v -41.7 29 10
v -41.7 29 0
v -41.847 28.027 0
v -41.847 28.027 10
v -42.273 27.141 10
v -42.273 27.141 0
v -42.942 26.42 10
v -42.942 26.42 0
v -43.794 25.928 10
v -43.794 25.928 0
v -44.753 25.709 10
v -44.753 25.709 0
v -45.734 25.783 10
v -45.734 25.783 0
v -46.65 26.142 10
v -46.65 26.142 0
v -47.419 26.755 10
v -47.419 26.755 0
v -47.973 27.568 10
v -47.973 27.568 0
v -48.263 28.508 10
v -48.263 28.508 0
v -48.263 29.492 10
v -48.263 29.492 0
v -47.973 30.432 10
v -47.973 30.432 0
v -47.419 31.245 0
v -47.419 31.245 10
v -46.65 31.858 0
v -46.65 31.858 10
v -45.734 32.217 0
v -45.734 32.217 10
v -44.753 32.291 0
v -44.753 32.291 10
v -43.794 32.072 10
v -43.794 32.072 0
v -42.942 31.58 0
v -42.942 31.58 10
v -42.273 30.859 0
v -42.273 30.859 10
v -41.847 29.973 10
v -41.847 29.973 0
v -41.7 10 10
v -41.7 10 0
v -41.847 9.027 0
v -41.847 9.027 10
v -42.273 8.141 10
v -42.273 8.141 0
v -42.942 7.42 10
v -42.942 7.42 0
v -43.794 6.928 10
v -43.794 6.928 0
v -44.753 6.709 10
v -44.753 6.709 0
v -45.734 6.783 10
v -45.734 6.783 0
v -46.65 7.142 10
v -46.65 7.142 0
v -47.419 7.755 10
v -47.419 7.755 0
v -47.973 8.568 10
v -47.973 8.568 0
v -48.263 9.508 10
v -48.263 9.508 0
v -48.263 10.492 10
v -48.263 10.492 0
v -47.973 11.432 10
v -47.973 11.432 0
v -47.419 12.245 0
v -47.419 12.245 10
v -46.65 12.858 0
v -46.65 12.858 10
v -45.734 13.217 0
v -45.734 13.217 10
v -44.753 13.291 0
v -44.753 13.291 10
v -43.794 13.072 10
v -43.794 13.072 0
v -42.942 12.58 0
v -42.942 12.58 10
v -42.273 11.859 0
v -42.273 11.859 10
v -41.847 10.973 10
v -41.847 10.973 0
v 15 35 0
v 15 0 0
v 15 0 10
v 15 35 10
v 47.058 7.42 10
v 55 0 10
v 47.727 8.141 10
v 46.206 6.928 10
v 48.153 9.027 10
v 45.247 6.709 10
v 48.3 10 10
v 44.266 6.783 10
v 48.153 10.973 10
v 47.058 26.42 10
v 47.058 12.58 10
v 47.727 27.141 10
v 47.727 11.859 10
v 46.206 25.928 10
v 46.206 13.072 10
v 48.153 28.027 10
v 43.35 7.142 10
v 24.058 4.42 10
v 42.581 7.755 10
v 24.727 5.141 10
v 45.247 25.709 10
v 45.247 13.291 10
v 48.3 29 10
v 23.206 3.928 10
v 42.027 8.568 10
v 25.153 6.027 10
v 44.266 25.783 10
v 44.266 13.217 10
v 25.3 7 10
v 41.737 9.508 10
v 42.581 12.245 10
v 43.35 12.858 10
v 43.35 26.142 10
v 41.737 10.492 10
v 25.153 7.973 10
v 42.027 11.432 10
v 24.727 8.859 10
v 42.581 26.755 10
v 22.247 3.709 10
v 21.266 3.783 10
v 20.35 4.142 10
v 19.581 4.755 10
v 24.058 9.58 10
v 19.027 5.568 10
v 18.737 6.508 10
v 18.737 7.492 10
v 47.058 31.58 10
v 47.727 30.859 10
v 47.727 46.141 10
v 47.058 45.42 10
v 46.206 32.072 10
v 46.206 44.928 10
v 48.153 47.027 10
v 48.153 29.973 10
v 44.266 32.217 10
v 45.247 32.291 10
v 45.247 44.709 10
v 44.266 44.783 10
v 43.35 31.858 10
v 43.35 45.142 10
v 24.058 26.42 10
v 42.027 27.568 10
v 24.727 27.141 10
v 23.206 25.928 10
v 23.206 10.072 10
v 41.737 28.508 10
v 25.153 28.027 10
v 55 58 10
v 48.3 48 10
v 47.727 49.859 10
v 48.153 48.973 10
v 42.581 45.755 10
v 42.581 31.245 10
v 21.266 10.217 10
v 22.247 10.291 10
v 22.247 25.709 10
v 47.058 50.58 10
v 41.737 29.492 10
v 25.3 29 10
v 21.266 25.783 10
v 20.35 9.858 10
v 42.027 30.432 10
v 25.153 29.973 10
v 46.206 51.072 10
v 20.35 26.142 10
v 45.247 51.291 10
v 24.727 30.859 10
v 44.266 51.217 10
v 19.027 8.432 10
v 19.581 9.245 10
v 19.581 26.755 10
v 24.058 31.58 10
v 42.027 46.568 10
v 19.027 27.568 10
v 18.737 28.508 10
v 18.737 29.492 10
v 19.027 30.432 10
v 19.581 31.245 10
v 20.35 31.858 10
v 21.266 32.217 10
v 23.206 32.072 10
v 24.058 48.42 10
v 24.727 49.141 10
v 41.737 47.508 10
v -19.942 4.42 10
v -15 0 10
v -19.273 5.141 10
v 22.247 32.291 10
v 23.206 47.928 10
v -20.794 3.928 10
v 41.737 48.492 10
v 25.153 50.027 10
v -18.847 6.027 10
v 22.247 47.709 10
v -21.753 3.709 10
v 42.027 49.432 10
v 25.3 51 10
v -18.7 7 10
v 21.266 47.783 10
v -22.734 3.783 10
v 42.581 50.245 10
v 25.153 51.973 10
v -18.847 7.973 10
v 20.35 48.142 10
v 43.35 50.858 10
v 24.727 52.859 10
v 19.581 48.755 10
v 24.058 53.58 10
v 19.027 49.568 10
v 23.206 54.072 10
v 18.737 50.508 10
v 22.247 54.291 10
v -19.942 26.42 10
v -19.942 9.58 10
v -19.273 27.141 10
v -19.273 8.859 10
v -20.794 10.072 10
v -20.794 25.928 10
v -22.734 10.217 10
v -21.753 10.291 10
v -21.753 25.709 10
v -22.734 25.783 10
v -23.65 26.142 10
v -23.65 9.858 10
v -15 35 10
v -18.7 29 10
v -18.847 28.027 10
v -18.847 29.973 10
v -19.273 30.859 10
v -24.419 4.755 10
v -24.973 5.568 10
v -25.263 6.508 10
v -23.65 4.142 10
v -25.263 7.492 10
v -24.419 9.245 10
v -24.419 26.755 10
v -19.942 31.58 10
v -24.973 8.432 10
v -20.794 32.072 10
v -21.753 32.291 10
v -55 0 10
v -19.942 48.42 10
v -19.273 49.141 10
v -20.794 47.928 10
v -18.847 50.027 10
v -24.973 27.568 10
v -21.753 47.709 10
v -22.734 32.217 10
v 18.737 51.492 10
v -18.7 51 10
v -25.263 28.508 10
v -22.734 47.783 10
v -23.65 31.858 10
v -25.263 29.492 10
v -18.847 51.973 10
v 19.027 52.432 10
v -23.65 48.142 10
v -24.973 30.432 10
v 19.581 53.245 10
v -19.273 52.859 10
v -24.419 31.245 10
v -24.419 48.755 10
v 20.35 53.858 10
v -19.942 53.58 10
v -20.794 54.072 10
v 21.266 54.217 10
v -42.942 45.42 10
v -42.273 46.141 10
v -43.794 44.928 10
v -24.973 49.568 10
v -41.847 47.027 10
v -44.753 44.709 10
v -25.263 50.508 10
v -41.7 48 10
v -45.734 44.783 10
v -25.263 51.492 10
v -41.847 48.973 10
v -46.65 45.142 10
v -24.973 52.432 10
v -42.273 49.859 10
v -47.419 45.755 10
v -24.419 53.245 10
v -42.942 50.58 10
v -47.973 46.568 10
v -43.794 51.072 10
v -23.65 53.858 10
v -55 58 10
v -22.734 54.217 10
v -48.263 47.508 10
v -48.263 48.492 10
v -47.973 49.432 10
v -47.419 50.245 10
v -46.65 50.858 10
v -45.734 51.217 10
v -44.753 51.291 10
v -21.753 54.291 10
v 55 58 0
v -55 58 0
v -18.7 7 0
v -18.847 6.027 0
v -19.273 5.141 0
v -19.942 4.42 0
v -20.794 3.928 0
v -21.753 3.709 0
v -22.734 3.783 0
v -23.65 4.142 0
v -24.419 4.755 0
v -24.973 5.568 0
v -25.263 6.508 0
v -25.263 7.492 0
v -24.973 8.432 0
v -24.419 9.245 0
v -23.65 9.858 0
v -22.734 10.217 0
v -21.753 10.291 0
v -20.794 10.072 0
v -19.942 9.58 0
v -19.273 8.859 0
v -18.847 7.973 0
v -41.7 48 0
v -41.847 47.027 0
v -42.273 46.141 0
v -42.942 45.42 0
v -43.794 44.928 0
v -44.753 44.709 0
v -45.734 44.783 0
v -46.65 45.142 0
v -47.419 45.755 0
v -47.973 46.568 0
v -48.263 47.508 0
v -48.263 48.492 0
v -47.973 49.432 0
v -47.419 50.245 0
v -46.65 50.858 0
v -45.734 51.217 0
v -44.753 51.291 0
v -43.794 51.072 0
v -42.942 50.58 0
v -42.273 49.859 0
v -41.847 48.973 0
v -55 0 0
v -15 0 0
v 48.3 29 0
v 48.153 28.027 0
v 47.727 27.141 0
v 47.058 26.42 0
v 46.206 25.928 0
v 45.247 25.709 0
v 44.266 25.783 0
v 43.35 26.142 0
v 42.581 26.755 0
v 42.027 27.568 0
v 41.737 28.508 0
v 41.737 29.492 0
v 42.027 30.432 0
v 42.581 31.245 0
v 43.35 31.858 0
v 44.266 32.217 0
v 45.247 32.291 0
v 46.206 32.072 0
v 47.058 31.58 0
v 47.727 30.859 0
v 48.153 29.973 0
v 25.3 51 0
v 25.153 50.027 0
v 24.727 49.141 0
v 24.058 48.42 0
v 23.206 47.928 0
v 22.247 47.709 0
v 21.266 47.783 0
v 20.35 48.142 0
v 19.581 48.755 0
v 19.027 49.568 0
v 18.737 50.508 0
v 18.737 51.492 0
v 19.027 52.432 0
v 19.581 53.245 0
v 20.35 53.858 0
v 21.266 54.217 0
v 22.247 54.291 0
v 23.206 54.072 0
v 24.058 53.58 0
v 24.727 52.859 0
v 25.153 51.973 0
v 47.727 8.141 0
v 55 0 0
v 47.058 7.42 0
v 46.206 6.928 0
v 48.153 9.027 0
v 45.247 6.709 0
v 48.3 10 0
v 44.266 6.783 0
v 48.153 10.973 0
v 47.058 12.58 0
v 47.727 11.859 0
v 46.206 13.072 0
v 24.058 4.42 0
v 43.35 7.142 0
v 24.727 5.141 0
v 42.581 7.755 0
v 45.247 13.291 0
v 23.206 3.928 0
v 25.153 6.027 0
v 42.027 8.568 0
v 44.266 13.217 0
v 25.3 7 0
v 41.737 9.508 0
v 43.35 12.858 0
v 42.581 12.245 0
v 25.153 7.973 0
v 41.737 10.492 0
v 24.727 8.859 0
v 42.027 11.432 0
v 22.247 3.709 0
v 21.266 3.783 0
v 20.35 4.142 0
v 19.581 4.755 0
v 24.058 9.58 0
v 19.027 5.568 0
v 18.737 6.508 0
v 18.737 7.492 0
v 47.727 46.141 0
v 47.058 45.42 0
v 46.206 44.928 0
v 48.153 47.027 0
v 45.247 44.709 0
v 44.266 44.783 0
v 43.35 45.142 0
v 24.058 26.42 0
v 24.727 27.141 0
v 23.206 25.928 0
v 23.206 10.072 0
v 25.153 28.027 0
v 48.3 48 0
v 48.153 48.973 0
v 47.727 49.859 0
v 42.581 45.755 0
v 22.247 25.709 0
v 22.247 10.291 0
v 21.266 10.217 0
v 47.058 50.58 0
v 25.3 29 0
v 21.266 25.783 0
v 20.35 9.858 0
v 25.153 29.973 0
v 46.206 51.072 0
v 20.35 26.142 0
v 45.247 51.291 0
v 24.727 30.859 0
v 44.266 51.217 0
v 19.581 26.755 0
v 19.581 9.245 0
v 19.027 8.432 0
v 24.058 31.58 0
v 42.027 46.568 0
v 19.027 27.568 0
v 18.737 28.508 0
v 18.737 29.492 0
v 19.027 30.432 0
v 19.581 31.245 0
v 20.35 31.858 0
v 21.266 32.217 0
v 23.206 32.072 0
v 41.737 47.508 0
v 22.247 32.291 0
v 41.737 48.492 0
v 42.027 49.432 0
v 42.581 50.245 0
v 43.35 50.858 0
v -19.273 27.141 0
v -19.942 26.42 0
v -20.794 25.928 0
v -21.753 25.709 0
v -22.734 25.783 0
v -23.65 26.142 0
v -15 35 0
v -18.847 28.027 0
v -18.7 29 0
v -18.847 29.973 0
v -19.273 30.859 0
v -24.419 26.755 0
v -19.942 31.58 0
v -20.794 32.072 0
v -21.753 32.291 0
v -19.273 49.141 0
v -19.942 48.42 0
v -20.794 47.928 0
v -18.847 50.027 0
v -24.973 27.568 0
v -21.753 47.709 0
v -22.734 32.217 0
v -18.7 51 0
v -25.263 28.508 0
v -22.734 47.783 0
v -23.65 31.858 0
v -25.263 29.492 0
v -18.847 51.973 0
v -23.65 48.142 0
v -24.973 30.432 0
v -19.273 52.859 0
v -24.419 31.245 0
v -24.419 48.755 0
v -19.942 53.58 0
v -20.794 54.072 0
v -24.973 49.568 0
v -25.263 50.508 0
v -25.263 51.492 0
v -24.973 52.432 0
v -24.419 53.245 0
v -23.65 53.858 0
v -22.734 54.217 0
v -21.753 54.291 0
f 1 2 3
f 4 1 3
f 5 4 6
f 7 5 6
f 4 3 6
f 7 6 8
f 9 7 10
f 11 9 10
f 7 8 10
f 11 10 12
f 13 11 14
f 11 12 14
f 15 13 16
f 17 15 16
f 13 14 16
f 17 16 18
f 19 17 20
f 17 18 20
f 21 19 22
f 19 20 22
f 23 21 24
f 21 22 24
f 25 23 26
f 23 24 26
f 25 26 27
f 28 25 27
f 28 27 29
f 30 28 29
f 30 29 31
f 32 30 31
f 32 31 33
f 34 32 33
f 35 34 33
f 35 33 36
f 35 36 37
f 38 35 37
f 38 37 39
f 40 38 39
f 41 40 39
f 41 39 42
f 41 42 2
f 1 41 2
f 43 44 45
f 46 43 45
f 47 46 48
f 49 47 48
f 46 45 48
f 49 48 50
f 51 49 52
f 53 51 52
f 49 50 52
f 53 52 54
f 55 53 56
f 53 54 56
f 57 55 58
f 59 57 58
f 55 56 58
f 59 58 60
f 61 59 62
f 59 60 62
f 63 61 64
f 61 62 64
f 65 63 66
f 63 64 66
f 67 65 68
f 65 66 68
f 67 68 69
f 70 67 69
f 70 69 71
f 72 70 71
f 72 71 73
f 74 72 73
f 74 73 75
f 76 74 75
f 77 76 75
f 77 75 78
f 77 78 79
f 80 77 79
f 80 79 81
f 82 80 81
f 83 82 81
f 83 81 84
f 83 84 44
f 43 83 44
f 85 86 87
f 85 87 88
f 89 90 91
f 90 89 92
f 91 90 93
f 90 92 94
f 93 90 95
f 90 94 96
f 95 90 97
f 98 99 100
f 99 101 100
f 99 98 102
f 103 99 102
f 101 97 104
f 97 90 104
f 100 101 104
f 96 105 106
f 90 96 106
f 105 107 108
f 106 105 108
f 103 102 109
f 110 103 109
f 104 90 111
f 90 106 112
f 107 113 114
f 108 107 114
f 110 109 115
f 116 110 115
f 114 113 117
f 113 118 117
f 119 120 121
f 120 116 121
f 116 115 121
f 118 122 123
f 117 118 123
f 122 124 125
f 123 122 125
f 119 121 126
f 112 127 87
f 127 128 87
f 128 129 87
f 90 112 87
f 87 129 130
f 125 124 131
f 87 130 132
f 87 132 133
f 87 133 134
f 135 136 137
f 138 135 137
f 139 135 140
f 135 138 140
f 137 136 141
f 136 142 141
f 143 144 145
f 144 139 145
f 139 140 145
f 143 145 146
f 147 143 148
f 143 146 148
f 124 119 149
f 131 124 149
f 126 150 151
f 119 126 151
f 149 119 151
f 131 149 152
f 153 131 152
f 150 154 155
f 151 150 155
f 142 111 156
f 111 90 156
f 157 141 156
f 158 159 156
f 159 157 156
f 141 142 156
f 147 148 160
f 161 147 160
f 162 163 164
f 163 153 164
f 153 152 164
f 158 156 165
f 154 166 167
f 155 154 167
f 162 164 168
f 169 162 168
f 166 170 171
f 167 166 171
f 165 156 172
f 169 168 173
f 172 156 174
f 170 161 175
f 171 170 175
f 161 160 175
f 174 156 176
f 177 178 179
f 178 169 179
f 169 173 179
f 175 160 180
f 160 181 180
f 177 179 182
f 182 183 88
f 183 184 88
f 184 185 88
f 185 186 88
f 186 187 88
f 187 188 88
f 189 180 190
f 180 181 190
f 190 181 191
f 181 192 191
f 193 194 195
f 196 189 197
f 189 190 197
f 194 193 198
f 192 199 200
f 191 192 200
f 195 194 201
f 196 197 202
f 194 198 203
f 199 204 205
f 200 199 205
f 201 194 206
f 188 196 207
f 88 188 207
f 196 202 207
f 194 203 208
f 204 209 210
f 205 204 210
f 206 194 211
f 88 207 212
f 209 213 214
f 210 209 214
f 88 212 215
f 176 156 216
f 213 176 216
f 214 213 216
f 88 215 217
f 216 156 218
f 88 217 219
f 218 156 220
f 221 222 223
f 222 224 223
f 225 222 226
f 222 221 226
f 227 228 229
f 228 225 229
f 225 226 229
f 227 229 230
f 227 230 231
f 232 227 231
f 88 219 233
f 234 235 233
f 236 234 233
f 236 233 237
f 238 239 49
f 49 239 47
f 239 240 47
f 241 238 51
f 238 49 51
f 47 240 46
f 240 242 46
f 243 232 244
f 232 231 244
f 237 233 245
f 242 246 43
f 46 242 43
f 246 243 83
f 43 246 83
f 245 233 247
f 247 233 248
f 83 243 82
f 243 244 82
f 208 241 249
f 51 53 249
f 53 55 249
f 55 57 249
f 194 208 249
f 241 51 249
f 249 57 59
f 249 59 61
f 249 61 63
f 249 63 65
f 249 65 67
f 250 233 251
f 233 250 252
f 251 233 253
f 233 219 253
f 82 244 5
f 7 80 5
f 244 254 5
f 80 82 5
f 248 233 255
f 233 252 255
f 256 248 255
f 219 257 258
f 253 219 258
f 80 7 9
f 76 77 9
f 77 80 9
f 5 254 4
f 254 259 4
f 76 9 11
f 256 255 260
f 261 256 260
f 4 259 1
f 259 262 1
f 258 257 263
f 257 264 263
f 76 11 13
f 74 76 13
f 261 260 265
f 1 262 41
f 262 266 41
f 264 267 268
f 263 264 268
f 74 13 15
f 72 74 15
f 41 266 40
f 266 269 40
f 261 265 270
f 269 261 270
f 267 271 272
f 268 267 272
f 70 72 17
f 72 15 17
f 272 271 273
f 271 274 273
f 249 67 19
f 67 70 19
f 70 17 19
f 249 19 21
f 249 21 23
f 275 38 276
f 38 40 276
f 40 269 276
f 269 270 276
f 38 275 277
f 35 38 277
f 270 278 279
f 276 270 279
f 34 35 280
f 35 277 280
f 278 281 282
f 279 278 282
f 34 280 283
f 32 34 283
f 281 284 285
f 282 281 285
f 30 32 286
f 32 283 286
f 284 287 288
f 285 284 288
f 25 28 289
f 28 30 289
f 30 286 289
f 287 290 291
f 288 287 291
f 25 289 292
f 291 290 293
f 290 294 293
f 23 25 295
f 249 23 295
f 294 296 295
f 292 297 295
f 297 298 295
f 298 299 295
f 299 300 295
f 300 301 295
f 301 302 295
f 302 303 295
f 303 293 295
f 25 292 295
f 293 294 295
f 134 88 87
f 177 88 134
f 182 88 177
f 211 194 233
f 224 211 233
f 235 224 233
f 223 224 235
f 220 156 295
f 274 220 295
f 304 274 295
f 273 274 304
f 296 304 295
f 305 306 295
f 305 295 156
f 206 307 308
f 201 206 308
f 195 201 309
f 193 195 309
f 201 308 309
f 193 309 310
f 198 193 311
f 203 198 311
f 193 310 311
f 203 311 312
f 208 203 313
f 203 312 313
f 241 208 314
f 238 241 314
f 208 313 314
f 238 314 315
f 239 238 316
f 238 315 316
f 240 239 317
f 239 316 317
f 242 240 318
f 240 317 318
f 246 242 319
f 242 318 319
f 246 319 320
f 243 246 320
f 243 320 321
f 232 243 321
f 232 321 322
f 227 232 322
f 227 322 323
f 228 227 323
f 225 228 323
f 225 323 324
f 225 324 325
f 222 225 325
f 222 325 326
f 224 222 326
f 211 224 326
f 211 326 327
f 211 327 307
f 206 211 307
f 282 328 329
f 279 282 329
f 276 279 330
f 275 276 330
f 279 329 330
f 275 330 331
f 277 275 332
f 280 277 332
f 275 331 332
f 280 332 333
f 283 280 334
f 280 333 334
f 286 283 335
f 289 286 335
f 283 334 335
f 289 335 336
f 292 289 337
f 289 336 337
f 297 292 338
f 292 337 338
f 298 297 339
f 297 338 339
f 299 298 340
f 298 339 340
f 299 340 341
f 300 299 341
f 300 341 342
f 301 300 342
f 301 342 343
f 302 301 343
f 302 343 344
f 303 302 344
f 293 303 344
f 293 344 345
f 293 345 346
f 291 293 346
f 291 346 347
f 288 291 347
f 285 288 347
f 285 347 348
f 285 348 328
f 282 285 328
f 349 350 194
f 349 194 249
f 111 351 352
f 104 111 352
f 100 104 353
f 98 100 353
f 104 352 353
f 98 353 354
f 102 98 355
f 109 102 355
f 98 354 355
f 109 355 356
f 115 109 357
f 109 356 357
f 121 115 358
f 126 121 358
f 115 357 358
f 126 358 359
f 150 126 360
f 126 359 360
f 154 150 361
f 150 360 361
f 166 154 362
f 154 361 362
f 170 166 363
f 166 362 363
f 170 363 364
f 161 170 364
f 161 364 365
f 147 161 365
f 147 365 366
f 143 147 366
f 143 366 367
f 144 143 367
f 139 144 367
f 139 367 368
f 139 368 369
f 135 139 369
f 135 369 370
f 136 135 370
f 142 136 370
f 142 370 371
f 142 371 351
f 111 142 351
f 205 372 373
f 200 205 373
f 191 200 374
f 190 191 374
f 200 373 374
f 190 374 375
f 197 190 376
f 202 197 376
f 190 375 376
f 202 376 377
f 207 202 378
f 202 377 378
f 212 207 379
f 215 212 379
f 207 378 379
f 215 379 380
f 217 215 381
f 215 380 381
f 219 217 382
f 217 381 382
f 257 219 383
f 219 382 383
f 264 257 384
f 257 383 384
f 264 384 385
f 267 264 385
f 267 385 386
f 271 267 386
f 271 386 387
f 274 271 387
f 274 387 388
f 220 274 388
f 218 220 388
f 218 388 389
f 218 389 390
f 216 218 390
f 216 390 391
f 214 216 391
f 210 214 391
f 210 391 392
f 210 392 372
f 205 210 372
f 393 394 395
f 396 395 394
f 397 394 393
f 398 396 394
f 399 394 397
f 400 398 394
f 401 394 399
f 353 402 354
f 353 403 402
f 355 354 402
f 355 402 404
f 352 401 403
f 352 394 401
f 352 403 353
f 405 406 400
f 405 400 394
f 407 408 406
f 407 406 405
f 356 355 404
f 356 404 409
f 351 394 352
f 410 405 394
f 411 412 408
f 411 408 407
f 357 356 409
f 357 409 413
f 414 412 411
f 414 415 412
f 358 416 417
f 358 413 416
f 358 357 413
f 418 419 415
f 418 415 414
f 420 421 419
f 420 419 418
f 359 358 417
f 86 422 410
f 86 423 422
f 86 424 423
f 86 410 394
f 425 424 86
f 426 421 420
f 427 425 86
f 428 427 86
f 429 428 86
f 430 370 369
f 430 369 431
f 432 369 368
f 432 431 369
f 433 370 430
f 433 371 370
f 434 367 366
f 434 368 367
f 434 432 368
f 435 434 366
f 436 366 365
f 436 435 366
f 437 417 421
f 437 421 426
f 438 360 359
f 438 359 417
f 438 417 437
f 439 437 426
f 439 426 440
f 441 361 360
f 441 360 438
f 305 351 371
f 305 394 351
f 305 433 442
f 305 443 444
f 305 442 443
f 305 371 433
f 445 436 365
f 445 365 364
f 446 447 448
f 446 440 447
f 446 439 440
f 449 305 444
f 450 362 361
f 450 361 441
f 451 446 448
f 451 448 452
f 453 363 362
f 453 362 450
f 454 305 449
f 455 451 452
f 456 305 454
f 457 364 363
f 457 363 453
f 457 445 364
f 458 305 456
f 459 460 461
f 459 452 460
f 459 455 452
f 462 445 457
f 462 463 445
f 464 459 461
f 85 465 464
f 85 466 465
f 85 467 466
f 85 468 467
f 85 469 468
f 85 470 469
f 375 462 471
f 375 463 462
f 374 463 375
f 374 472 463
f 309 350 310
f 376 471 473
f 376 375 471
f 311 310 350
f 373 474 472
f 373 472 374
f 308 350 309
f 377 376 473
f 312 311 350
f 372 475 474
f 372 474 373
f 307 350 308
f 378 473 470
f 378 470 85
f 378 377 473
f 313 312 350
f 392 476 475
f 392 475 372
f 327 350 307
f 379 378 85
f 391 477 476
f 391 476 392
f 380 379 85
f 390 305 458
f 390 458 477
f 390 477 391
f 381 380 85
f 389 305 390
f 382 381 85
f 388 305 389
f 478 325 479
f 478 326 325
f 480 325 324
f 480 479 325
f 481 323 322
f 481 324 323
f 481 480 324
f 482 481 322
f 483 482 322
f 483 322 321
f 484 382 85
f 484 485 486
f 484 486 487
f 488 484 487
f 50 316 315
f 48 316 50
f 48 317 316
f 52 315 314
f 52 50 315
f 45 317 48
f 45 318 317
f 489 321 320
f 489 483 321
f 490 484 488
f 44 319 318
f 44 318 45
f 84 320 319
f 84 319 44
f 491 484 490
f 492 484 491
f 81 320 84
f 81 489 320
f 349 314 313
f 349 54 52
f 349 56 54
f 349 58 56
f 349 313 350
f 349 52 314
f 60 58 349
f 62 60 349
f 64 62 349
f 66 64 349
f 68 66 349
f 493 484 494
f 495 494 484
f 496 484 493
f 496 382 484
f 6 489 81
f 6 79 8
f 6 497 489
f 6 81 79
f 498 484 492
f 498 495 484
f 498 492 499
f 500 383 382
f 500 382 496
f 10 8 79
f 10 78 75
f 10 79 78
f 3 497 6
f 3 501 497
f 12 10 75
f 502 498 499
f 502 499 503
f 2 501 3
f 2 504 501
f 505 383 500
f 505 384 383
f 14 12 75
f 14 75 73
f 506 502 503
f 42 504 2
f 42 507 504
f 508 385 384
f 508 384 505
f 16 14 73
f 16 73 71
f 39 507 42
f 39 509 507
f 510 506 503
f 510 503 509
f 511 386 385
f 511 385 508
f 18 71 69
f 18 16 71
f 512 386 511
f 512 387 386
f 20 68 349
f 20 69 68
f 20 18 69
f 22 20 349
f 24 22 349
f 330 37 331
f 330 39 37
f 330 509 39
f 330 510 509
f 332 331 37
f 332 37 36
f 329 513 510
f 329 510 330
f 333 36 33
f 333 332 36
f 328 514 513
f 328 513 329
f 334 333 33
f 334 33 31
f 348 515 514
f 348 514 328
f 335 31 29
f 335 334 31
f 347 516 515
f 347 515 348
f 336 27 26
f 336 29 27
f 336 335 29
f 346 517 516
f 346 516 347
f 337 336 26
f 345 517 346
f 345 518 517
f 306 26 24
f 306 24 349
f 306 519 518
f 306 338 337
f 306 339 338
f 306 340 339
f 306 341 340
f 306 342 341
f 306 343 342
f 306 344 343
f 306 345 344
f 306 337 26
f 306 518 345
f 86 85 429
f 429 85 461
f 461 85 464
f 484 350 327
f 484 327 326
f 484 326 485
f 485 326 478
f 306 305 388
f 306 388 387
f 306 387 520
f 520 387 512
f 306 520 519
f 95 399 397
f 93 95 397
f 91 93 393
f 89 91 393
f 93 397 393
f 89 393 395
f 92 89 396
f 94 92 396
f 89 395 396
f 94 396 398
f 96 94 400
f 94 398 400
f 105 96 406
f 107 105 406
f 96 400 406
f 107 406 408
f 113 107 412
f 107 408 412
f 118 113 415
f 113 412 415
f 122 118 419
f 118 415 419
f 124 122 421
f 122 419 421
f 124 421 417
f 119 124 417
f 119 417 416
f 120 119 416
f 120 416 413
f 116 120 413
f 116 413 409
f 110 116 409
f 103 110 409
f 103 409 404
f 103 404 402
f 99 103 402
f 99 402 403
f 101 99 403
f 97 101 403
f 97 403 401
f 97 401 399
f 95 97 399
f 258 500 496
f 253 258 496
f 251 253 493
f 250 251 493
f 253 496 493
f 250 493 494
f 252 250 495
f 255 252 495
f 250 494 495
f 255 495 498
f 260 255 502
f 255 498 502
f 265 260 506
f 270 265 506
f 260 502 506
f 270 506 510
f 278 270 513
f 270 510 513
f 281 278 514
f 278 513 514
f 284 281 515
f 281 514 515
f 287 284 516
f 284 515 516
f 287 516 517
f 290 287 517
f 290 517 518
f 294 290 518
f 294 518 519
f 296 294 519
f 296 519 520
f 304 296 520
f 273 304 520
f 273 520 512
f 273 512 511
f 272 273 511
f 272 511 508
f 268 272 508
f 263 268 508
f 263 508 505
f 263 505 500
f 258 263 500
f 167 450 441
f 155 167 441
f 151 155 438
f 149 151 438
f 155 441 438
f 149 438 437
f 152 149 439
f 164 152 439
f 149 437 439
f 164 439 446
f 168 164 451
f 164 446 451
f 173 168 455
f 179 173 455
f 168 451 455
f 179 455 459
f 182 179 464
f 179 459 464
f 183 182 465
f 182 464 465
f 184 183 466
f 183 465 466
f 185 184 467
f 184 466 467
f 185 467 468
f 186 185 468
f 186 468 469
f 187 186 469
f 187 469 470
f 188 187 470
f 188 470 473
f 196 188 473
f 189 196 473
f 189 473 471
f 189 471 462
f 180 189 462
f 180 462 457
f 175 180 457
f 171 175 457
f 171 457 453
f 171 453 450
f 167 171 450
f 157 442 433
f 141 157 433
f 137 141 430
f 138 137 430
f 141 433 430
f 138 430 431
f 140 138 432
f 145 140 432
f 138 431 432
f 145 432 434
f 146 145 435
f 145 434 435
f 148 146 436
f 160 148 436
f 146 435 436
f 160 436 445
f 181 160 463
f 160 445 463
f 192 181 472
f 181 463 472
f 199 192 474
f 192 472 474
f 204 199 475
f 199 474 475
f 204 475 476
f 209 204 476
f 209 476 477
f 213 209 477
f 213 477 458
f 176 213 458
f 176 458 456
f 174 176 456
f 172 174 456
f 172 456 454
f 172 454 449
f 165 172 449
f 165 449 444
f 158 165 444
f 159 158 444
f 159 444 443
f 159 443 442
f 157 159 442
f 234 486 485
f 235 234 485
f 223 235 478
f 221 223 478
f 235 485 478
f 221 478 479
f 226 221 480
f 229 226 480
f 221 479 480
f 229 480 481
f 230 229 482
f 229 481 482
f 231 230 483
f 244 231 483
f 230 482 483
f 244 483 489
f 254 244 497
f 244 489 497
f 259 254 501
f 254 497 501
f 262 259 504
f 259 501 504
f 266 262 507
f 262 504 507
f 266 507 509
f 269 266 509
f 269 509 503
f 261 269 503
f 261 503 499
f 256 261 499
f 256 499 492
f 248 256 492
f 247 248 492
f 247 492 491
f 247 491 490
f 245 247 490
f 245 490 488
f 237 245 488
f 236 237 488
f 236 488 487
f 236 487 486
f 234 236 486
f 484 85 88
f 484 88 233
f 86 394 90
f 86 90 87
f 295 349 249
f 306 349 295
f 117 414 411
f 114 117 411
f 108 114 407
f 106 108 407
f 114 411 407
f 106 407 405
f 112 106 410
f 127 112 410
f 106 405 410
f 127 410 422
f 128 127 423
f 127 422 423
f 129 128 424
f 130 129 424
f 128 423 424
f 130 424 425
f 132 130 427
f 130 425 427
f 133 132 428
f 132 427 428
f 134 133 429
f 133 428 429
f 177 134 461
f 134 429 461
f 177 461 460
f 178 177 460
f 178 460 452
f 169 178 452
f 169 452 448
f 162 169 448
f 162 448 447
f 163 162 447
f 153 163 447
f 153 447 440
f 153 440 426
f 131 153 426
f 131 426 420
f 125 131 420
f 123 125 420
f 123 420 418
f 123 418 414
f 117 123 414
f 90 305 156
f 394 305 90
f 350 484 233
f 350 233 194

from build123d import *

# Parameters (mm, degrees)
BOSS_EXTRUDE1_DEPTH = 10
M6_CLEARANCE_HOLE_D = 6.6


with BuildPart() as part:
    # Sketch1 → Boss-Extrude1 (new body)
    with BuildSketch(Plane.XY):
        Polygon((55, 0), (15, 0), (15, 35), (-15, 35), (-15, 0), (-55, 0), (-55, 58), (55, 58), align=None)
    extrude(amount=BOSS_EXTRUDE1_DEPTH)

    # M6 Clearance Hole (through all)
    with Locations(Plane(origin=(559.845790405, 1460.886073068, 10), x_dir=(-1, 0, 0), z_dir=(0, 0, 1))):
        with Locations((514.845790405, 1450.886073068), (514.845790405, 1412.886073068), (537.845790405, 1453.886073068), (537.845790405, 1409.886073068), (581.845790405, 1453.886073068), (581.845790405, 1409.886073068), (604.845790405, 1450.886073068), (604.845790405, 1412.886073068), (514.845790405, 897.471608895), (537.845790405, 897.471608895), (581.845790405, 897.471608895), (604.845790405, 897.471608895), (394.752371414, 1482.156083565), (514.845790405, 1431.886073068), (537.845790405, 1431.886073068), (581.845790405, 1431.886073068), (604.845790405, 1431.886073068)):
            Hole(M6_CLEARANCE_HOLE_D / 2)


solid = part.part
